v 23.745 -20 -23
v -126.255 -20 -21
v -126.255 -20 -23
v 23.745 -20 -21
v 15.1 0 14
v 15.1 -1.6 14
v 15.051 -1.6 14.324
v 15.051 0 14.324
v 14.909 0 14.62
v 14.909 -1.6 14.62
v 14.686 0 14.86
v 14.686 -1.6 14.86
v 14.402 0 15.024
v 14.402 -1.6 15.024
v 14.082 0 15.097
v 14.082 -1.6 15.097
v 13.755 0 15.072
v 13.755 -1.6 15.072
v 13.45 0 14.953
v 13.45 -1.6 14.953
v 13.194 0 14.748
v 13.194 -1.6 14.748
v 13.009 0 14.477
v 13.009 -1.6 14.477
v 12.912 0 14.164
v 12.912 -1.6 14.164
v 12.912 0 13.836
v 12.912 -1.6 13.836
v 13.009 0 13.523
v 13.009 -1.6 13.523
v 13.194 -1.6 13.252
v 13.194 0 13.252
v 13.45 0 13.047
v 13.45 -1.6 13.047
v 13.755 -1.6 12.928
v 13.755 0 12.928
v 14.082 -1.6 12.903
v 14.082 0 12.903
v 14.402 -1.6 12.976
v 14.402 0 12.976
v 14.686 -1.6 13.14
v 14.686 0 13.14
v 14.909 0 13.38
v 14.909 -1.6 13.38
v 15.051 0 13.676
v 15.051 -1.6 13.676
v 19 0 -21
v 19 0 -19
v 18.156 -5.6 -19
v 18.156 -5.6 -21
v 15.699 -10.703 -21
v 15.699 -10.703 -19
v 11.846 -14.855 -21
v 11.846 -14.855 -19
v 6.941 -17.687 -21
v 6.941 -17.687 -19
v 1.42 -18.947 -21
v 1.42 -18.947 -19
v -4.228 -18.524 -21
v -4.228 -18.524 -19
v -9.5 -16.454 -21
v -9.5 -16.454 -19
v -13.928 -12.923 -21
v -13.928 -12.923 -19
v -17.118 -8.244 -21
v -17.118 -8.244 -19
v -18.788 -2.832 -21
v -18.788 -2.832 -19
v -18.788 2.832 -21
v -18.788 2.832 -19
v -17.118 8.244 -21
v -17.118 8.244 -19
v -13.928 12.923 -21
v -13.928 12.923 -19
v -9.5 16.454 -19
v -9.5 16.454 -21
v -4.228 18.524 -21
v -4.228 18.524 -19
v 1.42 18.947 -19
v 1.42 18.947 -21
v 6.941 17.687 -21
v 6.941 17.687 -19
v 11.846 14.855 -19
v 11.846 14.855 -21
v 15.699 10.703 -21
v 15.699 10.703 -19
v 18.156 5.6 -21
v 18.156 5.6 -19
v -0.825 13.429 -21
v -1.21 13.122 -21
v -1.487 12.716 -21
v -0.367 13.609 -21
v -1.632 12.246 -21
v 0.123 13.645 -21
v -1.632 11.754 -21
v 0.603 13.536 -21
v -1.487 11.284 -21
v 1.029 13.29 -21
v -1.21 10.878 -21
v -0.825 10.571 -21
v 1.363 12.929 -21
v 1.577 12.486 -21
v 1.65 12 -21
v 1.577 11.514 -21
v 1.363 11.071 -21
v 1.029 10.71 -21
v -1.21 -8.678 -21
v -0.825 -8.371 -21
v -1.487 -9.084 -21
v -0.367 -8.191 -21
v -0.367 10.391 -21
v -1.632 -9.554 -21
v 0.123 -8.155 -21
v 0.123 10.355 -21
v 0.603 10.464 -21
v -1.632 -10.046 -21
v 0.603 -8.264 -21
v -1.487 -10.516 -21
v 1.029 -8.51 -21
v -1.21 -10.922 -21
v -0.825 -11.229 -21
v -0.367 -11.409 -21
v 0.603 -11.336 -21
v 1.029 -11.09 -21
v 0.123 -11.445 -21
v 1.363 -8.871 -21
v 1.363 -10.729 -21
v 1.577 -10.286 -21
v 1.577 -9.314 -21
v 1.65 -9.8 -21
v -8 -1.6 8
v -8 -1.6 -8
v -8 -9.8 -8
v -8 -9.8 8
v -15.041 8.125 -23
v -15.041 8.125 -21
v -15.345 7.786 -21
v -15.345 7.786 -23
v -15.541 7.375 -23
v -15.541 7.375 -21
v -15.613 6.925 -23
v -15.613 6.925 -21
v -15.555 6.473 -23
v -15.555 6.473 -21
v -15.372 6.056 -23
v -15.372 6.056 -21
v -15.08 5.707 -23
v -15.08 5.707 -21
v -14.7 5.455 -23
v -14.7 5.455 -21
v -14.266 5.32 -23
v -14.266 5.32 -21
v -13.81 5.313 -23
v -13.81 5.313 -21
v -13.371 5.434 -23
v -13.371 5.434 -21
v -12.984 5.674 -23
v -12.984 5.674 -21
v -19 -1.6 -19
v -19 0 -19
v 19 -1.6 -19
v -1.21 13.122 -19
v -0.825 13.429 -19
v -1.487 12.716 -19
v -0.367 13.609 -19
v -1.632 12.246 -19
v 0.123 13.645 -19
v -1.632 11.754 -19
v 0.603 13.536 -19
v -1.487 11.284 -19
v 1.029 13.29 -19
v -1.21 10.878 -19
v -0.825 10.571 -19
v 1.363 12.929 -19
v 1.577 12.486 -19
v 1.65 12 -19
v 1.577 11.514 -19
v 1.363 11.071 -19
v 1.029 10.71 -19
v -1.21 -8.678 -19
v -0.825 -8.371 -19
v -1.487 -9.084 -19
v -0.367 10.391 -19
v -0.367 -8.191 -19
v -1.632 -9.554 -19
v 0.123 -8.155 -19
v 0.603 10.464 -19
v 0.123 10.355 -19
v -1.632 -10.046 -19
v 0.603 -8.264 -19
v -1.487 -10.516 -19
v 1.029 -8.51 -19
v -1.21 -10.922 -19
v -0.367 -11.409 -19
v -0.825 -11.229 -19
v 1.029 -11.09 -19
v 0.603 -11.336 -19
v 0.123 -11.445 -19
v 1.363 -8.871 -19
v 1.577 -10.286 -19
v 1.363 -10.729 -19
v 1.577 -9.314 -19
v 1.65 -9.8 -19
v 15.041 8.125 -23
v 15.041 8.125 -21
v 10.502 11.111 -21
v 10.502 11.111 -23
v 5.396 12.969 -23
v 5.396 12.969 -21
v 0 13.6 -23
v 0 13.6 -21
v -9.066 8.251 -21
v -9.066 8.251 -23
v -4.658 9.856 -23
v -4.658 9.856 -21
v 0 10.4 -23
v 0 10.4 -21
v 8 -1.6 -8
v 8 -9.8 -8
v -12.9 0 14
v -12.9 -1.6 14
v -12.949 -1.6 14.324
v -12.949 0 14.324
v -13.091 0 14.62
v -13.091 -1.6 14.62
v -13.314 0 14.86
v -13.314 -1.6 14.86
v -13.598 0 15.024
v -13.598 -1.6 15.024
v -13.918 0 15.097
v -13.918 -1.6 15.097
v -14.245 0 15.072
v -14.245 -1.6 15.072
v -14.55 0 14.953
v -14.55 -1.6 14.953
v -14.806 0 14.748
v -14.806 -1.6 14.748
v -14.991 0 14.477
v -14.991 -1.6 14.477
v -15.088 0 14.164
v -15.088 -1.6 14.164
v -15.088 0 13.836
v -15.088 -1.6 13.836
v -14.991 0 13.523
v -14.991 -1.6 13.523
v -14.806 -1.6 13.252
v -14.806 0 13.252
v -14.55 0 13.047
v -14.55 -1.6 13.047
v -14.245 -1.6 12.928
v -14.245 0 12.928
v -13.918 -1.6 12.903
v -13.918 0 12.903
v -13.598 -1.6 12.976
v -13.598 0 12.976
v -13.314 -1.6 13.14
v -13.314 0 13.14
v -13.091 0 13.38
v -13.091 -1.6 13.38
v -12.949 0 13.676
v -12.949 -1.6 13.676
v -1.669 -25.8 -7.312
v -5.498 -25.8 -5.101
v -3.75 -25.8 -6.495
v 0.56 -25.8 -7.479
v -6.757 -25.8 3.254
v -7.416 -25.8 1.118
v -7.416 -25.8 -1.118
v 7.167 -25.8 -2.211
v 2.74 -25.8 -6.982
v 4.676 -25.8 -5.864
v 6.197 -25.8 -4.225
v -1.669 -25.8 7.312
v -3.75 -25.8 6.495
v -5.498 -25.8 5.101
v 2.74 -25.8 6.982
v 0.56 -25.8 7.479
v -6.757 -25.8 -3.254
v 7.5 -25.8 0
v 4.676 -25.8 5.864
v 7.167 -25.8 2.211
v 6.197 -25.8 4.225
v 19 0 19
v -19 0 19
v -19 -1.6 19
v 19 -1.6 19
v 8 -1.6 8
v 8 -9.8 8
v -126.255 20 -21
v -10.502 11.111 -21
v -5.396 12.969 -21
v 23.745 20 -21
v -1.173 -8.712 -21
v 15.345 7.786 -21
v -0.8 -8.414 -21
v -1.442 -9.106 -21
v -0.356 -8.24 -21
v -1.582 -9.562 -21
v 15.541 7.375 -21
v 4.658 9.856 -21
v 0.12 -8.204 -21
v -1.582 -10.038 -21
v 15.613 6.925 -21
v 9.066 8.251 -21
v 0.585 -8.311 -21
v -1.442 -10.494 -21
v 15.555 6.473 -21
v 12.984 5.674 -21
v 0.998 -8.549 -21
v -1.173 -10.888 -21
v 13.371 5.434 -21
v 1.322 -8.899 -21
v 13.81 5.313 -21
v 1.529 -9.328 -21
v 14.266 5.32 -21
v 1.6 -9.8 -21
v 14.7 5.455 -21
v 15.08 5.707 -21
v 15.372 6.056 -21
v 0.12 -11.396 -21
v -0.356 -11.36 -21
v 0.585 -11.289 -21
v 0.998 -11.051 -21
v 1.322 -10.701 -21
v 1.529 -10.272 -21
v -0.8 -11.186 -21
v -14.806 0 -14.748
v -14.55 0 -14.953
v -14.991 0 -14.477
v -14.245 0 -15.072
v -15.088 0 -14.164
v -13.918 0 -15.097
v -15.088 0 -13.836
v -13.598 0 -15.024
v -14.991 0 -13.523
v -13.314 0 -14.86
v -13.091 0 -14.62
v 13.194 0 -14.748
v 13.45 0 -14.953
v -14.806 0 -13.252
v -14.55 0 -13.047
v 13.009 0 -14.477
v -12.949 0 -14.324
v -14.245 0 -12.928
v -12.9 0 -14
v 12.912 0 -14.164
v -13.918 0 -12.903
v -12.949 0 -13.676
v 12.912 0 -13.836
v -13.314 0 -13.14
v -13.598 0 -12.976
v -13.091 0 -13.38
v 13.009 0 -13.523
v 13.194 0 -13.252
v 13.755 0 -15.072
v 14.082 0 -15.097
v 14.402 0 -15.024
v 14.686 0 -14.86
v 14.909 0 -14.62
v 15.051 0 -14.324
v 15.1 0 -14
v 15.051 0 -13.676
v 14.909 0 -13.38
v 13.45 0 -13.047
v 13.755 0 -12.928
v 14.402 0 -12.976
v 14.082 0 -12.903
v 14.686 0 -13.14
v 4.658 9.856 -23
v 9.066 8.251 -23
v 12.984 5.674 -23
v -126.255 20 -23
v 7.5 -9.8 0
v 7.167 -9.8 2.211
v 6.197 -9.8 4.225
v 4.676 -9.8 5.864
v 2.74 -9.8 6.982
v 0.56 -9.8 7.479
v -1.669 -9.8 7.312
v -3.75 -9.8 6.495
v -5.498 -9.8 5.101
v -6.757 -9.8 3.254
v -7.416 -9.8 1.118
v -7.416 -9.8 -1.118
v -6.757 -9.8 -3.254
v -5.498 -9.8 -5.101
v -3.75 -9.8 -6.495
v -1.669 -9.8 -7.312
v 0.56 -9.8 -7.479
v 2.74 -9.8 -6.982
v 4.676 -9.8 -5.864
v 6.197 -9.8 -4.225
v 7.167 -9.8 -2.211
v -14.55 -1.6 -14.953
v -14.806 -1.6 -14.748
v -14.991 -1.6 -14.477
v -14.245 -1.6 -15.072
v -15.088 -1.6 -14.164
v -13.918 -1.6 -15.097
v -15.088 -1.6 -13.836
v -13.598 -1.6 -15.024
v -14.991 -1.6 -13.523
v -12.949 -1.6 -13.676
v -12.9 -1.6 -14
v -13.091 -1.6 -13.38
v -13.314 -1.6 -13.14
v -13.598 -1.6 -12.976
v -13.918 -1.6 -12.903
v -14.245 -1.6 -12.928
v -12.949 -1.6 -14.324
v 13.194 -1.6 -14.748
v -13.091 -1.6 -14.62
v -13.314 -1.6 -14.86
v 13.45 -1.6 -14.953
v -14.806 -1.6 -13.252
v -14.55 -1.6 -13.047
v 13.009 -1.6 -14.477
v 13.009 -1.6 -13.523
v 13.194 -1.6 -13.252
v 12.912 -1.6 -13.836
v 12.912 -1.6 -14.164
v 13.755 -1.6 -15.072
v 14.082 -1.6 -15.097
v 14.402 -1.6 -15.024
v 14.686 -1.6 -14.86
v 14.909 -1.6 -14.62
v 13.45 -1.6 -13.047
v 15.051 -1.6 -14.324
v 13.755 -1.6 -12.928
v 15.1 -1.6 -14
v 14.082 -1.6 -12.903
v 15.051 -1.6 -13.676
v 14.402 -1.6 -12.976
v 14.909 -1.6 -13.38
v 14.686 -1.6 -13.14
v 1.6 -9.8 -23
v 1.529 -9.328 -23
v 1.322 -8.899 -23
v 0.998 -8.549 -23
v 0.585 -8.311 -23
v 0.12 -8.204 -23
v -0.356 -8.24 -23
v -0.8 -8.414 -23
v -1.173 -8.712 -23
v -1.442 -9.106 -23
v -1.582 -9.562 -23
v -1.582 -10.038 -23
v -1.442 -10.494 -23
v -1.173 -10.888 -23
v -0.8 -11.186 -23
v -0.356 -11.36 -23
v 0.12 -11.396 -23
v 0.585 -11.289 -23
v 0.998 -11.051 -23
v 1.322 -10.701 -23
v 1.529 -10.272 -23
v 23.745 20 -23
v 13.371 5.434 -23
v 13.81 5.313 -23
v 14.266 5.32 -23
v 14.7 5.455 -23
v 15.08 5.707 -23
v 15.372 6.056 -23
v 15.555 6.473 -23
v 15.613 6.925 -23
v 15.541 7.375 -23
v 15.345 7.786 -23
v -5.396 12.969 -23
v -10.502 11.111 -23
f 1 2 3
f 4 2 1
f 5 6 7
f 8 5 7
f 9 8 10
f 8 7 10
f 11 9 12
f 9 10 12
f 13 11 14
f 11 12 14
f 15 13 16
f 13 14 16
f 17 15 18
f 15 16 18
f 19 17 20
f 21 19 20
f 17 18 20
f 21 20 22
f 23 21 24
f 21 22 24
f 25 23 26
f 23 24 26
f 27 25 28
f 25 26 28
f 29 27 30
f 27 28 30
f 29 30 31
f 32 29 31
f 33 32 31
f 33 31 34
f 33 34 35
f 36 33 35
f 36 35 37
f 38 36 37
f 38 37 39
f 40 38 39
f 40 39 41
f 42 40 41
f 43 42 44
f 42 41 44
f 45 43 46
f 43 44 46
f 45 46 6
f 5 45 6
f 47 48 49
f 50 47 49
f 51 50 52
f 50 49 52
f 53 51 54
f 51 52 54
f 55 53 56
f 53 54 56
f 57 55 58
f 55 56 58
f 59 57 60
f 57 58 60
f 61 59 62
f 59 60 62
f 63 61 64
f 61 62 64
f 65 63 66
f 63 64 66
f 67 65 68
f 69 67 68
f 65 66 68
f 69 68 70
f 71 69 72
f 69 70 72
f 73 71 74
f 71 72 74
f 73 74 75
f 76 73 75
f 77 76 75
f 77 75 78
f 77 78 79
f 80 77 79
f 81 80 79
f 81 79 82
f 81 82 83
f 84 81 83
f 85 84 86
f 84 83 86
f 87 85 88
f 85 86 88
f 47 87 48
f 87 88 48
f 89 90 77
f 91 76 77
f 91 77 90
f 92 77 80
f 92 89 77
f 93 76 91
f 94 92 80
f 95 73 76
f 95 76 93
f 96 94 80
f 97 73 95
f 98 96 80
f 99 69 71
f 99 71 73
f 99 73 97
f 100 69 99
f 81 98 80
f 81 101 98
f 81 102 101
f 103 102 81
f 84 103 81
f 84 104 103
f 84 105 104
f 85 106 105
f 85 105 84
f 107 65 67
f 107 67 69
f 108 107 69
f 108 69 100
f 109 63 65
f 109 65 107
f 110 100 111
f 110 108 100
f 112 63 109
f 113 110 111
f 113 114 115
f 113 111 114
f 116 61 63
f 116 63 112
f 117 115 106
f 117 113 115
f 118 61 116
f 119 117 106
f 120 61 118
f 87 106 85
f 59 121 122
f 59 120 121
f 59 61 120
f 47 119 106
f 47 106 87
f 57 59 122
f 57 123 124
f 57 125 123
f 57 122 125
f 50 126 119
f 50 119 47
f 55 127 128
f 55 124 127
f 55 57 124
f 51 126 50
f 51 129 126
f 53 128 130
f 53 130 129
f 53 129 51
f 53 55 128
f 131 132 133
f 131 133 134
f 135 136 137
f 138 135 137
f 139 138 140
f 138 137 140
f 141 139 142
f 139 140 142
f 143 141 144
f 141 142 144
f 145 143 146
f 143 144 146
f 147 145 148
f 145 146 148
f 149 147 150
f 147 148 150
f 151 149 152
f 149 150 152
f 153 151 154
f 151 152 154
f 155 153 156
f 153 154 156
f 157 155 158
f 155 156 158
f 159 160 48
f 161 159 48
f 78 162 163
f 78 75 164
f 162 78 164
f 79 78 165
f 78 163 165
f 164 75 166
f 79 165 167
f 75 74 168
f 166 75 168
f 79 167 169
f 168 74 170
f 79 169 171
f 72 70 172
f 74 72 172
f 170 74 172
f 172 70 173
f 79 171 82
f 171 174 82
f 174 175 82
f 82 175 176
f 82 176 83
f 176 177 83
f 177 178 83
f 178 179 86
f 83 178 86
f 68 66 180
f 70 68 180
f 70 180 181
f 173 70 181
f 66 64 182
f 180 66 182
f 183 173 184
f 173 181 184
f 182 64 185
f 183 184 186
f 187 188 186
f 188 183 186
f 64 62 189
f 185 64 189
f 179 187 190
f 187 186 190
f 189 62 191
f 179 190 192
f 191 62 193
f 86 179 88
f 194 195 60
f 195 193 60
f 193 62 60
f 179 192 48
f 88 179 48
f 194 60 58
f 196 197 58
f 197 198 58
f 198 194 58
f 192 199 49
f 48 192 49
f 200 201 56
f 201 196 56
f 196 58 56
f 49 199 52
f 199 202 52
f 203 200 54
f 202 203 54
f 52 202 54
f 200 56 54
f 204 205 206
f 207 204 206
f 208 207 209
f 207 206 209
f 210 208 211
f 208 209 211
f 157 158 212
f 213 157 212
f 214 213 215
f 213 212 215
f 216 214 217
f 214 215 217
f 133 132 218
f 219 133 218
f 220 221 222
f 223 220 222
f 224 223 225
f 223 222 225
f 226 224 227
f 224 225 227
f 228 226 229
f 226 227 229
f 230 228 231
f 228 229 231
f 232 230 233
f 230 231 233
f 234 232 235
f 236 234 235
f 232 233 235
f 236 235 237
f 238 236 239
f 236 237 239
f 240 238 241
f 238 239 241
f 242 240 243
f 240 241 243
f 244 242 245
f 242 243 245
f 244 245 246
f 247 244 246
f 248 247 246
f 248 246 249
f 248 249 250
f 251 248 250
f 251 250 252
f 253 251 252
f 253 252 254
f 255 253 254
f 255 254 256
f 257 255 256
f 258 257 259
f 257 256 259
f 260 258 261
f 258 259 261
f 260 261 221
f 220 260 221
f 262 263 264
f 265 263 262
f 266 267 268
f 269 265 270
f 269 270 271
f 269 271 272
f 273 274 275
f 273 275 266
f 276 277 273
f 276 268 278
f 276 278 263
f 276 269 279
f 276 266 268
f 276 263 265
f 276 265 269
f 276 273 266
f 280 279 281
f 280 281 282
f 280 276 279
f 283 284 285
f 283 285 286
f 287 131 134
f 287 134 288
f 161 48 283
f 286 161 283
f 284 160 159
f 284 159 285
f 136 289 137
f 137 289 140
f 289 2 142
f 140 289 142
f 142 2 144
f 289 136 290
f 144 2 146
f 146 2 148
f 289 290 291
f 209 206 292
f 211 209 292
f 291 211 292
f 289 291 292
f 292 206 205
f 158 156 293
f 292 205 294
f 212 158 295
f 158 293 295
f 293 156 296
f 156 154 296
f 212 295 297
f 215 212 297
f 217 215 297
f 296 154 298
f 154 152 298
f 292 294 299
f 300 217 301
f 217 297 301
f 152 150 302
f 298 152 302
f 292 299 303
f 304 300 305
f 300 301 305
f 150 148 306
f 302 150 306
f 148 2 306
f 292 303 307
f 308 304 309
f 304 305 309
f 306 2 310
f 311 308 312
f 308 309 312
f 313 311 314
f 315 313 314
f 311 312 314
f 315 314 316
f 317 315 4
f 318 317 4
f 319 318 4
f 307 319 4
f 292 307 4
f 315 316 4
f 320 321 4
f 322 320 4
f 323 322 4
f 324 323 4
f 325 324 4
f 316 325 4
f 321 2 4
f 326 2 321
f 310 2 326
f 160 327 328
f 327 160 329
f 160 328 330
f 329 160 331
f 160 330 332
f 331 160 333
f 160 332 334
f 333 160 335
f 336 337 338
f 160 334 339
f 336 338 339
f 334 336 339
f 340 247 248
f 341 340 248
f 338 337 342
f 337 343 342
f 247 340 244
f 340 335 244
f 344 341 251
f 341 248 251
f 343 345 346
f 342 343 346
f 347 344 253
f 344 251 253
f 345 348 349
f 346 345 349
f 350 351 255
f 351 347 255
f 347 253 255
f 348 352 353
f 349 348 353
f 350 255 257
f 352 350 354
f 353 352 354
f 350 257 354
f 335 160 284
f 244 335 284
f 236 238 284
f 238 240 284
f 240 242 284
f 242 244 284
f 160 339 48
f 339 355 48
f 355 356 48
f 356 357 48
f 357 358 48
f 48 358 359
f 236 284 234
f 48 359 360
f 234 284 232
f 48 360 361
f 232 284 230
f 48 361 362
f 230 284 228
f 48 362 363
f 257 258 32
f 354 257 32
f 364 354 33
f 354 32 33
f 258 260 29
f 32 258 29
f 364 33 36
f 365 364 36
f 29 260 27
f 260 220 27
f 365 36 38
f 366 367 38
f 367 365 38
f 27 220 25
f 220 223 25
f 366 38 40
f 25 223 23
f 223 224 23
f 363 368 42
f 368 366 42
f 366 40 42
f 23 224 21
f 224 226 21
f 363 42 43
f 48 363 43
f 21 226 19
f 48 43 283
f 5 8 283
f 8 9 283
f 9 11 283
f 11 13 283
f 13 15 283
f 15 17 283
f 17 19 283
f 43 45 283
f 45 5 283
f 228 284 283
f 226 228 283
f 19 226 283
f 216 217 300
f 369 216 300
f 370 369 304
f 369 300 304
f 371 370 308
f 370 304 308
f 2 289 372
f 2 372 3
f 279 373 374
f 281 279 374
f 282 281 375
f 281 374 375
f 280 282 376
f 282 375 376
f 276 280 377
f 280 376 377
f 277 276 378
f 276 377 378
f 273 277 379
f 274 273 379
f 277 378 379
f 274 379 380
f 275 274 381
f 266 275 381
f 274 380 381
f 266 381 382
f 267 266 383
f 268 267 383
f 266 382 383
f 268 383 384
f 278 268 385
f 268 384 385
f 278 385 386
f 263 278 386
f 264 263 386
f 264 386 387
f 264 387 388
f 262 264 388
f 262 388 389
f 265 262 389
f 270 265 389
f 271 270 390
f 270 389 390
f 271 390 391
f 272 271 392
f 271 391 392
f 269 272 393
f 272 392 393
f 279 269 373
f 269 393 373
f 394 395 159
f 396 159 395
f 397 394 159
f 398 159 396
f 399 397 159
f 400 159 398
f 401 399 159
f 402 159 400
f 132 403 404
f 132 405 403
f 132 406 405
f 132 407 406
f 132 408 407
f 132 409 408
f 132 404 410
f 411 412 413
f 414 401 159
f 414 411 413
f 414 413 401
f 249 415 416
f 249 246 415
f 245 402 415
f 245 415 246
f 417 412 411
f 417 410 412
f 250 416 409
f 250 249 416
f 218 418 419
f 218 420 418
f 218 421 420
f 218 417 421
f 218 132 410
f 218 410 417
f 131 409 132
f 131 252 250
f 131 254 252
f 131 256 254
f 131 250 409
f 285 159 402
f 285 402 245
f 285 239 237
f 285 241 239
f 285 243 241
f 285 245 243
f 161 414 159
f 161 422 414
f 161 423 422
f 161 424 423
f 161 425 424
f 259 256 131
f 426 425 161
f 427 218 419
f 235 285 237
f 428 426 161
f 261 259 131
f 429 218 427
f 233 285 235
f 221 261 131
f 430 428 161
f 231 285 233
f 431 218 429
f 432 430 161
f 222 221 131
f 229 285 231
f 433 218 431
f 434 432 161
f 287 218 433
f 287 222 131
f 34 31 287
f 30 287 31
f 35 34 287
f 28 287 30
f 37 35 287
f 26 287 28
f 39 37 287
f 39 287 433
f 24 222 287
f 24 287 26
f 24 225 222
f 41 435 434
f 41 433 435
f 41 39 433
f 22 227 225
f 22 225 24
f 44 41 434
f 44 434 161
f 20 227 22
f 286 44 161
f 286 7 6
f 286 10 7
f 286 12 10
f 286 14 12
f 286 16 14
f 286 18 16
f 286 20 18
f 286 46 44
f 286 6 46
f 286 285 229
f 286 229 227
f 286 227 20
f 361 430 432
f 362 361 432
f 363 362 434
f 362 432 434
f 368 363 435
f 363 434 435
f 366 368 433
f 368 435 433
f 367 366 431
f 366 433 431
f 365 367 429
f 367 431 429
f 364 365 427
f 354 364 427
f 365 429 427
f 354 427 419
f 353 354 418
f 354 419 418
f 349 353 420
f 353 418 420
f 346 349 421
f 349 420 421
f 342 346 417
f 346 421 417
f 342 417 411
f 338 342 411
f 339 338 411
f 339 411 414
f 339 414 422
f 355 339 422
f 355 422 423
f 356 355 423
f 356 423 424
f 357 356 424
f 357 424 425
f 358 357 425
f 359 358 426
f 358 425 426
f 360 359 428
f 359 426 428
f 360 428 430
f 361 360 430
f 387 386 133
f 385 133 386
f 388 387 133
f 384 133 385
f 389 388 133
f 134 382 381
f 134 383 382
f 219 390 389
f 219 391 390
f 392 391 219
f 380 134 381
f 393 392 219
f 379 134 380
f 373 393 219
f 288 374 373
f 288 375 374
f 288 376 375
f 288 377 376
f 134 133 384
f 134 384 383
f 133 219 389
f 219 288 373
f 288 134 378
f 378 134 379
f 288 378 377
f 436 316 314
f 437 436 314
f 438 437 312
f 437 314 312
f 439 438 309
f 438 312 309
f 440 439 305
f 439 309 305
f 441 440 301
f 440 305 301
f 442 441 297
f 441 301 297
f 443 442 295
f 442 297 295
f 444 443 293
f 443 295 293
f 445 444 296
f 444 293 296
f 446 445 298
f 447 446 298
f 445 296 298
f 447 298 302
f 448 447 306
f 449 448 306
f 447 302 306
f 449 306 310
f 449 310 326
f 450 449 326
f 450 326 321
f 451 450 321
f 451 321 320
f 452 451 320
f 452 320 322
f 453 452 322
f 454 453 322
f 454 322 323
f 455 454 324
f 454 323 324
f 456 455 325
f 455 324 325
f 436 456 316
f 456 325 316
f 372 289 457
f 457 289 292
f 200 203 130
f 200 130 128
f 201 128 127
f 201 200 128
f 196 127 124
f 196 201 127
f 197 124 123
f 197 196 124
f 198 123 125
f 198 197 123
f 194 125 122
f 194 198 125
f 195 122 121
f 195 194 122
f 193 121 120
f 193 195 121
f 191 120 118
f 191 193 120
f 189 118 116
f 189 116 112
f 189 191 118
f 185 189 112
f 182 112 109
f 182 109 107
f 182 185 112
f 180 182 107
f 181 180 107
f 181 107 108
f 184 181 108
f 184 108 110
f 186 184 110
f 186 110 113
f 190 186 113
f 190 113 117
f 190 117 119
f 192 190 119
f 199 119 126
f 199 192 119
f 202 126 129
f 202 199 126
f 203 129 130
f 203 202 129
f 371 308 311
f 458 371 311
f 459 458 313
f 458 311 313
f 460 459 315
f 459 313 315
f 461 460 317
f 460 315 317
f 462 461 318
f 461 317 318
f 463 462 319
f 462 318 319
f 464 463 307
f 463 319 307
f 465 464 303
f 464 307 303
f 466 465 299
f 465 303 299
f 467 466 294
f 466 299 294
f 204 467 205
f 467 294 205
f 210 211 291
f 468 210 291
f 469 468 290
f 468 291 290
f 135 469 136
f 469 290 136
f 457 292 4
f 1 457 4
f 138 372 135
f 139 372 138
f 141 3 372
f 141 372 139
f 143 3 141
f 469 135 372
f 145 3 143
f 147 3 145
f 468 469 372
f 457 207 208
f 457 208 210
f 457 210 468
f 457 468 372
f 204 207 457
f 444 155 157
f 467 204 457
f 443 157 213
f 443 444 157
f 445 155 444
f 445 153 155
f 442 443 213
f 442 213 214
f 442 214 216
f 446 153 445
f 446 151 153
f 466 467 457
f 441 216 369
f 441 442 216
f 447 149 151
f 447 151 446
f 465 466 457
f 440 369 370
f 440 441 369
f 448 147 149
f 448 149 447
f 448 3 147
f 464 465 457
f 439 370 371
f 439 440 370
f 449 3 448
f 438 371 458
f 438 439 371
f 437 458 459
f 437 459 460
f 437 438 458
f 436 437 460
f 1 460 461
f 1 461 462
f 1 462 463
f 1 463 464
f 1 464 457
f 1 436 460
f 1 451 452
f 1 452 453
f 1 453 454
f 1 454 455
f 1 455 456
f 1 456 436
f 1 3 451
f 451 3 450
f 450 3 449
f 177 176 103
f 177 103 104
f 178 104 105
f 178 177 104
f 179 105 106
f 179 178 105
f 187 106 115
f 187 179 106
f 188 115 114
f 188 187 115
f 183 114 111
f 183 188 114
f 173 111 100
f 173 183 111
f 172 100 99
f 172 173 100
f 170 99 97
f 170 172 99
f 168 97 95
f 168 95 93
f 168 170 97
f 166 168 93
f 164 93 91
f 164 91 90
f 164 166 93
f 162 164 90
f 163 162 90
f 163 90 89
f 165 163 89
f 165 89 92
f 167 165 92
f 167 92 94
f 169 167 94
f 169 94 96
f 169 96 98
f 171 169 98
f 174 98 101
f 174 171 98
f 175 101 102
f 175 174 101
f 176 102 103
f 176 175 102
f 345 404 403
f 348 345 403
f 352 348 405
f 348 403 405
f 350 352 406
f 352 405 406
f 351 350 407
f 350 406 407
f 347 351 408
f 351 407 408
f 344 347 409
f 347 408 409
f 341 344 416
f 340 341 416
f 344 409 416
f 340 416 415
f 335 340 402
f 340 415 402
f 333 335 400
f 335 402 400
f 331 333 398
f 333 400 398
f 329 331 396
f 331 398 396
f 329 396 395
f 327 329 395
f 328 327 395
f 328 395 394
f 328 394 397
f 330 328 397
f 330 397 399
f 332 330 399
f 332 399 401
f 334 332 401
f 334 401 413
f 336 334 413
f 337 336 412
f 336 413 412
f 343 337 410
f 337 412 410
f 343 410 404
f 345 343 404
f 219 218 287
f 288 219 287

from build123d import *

# Parameters (mm, degrees)
F0_W      = 38
F0_H      = 38
F1_DEPTH  = 1.6
F2_R      = 1.1
F3_DEPTH  = 1.6
F4_W      = 16
F4_H      = 16
F5_DEPTH  = 8.2
F6_R      = 7.5
F7_DEPTH  = 16
F8_R      = 19
F8_R_2    = 1.65
F9_DEPTH  = 2
F12_W     = 150
F12_H     = 40
F13_DEPTH = 2
F14_R     = 1.6
F15_DEPTH = 2


with BuildPart() as f1:
    # F0 (on Front) → F1 (new body)
    with BuildSketch(Plane.XZ):
        Rectangle(F0_W, F0_H)
    extrude(amount=F1_DEPTH)

    # F2 (on face) → F3 (cut, through all)
    with BuildSketch(Plane.XZ.offset(1.6)):
        with Locations((-14, 14)):
            Circle(F2_R)
        with Locations((14, 14)):
            Circle(F2_R)
        with Locations((-14, -14)):
            Circle(F2_R)
        with Locations((14, -14)):
            Circle(F2_R)
    extrude(amount=-F3_DEPTH, mode=Mode.SUBTRACT)

    # F4 (on face) → F5 (join)
    with BuildSketch(Plane.XZ.offset(1.6)):
        Rectangle(F4_W, F4_H)
    extrude(amount=F5_DEPTH)

    # F6 (on face) → F7 (join)
    with BuildSketch(Plane.XZ.offset(9.8)):
        Circle(F6_R)
    extrude(amount=F7_DEPTH)


with BuildPart() as f9:
    # F8 (on face) → F9 (new body)
    with BuildSketch(Plane(origin=(0, 0, -19), x_dir=(1, 0, 0), z_dir=(0, 0, -1))):
        Circle(F8_R)
        with Locations((0, -12)):
            Circle(F8_R_2, mode=Mode.SUBTRACT)
        with Locations((0, 9.8)):
            Circle(F8_R_2, mode=Mode.SUBTRACT)
    extrude(amount=F9_DEPTH)


with BuildPart() as f10_1:
    # F10: copy of F9
    add(f9.part)


with BuildPart() as f13:
    # F12 (on face) → F13 (new body)
    with BuildSketch(Plane(origin=(0, 0, -21), x_dir=(1, 0, 0), z_dir=(0, 0, -1))):
        with Locations((-51.255427, 0)):
            Rectangle(F12_W, F12_H)
    extrude(amount=F13_DEPTH)

    # F14 (on face) → F15 (cut, through all)
    with BuildSketch(Plane.XY.offset(-21)):
        with Locations((0, -9.8)):
            Circle(F14_R)
        with BuildLine():
            ThreePointArc((0, 13.6), (-8.003271, 12.188807), (-15.04123, 8.12544))
            ThreePointArc((-15.04123, 8.12544), (-15.238441, 5.871309), (-12.98431, 5.674098))
            ThreePointArc((-12.98431, 5.674098), (-6.908807, 9.181791), (0, 10.4))
            ThreePointArc((0, 10.4), (6.908807, 9.181791), (12.98431, 5.674098))
            ThreePointArc((12.98431, 5.674098), (15.238441, 5.871309), (15.04123, 8.12544))
            ThreePointArc((15.04123, 8.12544), (8.003271, 12.188807), (0, 13.6))
        make_face()
    extrude(amount=-F15_DEPTH, mode=Mode.SUBTRACT)


solid = Compound([f1.part, f9.part, f13.part])
